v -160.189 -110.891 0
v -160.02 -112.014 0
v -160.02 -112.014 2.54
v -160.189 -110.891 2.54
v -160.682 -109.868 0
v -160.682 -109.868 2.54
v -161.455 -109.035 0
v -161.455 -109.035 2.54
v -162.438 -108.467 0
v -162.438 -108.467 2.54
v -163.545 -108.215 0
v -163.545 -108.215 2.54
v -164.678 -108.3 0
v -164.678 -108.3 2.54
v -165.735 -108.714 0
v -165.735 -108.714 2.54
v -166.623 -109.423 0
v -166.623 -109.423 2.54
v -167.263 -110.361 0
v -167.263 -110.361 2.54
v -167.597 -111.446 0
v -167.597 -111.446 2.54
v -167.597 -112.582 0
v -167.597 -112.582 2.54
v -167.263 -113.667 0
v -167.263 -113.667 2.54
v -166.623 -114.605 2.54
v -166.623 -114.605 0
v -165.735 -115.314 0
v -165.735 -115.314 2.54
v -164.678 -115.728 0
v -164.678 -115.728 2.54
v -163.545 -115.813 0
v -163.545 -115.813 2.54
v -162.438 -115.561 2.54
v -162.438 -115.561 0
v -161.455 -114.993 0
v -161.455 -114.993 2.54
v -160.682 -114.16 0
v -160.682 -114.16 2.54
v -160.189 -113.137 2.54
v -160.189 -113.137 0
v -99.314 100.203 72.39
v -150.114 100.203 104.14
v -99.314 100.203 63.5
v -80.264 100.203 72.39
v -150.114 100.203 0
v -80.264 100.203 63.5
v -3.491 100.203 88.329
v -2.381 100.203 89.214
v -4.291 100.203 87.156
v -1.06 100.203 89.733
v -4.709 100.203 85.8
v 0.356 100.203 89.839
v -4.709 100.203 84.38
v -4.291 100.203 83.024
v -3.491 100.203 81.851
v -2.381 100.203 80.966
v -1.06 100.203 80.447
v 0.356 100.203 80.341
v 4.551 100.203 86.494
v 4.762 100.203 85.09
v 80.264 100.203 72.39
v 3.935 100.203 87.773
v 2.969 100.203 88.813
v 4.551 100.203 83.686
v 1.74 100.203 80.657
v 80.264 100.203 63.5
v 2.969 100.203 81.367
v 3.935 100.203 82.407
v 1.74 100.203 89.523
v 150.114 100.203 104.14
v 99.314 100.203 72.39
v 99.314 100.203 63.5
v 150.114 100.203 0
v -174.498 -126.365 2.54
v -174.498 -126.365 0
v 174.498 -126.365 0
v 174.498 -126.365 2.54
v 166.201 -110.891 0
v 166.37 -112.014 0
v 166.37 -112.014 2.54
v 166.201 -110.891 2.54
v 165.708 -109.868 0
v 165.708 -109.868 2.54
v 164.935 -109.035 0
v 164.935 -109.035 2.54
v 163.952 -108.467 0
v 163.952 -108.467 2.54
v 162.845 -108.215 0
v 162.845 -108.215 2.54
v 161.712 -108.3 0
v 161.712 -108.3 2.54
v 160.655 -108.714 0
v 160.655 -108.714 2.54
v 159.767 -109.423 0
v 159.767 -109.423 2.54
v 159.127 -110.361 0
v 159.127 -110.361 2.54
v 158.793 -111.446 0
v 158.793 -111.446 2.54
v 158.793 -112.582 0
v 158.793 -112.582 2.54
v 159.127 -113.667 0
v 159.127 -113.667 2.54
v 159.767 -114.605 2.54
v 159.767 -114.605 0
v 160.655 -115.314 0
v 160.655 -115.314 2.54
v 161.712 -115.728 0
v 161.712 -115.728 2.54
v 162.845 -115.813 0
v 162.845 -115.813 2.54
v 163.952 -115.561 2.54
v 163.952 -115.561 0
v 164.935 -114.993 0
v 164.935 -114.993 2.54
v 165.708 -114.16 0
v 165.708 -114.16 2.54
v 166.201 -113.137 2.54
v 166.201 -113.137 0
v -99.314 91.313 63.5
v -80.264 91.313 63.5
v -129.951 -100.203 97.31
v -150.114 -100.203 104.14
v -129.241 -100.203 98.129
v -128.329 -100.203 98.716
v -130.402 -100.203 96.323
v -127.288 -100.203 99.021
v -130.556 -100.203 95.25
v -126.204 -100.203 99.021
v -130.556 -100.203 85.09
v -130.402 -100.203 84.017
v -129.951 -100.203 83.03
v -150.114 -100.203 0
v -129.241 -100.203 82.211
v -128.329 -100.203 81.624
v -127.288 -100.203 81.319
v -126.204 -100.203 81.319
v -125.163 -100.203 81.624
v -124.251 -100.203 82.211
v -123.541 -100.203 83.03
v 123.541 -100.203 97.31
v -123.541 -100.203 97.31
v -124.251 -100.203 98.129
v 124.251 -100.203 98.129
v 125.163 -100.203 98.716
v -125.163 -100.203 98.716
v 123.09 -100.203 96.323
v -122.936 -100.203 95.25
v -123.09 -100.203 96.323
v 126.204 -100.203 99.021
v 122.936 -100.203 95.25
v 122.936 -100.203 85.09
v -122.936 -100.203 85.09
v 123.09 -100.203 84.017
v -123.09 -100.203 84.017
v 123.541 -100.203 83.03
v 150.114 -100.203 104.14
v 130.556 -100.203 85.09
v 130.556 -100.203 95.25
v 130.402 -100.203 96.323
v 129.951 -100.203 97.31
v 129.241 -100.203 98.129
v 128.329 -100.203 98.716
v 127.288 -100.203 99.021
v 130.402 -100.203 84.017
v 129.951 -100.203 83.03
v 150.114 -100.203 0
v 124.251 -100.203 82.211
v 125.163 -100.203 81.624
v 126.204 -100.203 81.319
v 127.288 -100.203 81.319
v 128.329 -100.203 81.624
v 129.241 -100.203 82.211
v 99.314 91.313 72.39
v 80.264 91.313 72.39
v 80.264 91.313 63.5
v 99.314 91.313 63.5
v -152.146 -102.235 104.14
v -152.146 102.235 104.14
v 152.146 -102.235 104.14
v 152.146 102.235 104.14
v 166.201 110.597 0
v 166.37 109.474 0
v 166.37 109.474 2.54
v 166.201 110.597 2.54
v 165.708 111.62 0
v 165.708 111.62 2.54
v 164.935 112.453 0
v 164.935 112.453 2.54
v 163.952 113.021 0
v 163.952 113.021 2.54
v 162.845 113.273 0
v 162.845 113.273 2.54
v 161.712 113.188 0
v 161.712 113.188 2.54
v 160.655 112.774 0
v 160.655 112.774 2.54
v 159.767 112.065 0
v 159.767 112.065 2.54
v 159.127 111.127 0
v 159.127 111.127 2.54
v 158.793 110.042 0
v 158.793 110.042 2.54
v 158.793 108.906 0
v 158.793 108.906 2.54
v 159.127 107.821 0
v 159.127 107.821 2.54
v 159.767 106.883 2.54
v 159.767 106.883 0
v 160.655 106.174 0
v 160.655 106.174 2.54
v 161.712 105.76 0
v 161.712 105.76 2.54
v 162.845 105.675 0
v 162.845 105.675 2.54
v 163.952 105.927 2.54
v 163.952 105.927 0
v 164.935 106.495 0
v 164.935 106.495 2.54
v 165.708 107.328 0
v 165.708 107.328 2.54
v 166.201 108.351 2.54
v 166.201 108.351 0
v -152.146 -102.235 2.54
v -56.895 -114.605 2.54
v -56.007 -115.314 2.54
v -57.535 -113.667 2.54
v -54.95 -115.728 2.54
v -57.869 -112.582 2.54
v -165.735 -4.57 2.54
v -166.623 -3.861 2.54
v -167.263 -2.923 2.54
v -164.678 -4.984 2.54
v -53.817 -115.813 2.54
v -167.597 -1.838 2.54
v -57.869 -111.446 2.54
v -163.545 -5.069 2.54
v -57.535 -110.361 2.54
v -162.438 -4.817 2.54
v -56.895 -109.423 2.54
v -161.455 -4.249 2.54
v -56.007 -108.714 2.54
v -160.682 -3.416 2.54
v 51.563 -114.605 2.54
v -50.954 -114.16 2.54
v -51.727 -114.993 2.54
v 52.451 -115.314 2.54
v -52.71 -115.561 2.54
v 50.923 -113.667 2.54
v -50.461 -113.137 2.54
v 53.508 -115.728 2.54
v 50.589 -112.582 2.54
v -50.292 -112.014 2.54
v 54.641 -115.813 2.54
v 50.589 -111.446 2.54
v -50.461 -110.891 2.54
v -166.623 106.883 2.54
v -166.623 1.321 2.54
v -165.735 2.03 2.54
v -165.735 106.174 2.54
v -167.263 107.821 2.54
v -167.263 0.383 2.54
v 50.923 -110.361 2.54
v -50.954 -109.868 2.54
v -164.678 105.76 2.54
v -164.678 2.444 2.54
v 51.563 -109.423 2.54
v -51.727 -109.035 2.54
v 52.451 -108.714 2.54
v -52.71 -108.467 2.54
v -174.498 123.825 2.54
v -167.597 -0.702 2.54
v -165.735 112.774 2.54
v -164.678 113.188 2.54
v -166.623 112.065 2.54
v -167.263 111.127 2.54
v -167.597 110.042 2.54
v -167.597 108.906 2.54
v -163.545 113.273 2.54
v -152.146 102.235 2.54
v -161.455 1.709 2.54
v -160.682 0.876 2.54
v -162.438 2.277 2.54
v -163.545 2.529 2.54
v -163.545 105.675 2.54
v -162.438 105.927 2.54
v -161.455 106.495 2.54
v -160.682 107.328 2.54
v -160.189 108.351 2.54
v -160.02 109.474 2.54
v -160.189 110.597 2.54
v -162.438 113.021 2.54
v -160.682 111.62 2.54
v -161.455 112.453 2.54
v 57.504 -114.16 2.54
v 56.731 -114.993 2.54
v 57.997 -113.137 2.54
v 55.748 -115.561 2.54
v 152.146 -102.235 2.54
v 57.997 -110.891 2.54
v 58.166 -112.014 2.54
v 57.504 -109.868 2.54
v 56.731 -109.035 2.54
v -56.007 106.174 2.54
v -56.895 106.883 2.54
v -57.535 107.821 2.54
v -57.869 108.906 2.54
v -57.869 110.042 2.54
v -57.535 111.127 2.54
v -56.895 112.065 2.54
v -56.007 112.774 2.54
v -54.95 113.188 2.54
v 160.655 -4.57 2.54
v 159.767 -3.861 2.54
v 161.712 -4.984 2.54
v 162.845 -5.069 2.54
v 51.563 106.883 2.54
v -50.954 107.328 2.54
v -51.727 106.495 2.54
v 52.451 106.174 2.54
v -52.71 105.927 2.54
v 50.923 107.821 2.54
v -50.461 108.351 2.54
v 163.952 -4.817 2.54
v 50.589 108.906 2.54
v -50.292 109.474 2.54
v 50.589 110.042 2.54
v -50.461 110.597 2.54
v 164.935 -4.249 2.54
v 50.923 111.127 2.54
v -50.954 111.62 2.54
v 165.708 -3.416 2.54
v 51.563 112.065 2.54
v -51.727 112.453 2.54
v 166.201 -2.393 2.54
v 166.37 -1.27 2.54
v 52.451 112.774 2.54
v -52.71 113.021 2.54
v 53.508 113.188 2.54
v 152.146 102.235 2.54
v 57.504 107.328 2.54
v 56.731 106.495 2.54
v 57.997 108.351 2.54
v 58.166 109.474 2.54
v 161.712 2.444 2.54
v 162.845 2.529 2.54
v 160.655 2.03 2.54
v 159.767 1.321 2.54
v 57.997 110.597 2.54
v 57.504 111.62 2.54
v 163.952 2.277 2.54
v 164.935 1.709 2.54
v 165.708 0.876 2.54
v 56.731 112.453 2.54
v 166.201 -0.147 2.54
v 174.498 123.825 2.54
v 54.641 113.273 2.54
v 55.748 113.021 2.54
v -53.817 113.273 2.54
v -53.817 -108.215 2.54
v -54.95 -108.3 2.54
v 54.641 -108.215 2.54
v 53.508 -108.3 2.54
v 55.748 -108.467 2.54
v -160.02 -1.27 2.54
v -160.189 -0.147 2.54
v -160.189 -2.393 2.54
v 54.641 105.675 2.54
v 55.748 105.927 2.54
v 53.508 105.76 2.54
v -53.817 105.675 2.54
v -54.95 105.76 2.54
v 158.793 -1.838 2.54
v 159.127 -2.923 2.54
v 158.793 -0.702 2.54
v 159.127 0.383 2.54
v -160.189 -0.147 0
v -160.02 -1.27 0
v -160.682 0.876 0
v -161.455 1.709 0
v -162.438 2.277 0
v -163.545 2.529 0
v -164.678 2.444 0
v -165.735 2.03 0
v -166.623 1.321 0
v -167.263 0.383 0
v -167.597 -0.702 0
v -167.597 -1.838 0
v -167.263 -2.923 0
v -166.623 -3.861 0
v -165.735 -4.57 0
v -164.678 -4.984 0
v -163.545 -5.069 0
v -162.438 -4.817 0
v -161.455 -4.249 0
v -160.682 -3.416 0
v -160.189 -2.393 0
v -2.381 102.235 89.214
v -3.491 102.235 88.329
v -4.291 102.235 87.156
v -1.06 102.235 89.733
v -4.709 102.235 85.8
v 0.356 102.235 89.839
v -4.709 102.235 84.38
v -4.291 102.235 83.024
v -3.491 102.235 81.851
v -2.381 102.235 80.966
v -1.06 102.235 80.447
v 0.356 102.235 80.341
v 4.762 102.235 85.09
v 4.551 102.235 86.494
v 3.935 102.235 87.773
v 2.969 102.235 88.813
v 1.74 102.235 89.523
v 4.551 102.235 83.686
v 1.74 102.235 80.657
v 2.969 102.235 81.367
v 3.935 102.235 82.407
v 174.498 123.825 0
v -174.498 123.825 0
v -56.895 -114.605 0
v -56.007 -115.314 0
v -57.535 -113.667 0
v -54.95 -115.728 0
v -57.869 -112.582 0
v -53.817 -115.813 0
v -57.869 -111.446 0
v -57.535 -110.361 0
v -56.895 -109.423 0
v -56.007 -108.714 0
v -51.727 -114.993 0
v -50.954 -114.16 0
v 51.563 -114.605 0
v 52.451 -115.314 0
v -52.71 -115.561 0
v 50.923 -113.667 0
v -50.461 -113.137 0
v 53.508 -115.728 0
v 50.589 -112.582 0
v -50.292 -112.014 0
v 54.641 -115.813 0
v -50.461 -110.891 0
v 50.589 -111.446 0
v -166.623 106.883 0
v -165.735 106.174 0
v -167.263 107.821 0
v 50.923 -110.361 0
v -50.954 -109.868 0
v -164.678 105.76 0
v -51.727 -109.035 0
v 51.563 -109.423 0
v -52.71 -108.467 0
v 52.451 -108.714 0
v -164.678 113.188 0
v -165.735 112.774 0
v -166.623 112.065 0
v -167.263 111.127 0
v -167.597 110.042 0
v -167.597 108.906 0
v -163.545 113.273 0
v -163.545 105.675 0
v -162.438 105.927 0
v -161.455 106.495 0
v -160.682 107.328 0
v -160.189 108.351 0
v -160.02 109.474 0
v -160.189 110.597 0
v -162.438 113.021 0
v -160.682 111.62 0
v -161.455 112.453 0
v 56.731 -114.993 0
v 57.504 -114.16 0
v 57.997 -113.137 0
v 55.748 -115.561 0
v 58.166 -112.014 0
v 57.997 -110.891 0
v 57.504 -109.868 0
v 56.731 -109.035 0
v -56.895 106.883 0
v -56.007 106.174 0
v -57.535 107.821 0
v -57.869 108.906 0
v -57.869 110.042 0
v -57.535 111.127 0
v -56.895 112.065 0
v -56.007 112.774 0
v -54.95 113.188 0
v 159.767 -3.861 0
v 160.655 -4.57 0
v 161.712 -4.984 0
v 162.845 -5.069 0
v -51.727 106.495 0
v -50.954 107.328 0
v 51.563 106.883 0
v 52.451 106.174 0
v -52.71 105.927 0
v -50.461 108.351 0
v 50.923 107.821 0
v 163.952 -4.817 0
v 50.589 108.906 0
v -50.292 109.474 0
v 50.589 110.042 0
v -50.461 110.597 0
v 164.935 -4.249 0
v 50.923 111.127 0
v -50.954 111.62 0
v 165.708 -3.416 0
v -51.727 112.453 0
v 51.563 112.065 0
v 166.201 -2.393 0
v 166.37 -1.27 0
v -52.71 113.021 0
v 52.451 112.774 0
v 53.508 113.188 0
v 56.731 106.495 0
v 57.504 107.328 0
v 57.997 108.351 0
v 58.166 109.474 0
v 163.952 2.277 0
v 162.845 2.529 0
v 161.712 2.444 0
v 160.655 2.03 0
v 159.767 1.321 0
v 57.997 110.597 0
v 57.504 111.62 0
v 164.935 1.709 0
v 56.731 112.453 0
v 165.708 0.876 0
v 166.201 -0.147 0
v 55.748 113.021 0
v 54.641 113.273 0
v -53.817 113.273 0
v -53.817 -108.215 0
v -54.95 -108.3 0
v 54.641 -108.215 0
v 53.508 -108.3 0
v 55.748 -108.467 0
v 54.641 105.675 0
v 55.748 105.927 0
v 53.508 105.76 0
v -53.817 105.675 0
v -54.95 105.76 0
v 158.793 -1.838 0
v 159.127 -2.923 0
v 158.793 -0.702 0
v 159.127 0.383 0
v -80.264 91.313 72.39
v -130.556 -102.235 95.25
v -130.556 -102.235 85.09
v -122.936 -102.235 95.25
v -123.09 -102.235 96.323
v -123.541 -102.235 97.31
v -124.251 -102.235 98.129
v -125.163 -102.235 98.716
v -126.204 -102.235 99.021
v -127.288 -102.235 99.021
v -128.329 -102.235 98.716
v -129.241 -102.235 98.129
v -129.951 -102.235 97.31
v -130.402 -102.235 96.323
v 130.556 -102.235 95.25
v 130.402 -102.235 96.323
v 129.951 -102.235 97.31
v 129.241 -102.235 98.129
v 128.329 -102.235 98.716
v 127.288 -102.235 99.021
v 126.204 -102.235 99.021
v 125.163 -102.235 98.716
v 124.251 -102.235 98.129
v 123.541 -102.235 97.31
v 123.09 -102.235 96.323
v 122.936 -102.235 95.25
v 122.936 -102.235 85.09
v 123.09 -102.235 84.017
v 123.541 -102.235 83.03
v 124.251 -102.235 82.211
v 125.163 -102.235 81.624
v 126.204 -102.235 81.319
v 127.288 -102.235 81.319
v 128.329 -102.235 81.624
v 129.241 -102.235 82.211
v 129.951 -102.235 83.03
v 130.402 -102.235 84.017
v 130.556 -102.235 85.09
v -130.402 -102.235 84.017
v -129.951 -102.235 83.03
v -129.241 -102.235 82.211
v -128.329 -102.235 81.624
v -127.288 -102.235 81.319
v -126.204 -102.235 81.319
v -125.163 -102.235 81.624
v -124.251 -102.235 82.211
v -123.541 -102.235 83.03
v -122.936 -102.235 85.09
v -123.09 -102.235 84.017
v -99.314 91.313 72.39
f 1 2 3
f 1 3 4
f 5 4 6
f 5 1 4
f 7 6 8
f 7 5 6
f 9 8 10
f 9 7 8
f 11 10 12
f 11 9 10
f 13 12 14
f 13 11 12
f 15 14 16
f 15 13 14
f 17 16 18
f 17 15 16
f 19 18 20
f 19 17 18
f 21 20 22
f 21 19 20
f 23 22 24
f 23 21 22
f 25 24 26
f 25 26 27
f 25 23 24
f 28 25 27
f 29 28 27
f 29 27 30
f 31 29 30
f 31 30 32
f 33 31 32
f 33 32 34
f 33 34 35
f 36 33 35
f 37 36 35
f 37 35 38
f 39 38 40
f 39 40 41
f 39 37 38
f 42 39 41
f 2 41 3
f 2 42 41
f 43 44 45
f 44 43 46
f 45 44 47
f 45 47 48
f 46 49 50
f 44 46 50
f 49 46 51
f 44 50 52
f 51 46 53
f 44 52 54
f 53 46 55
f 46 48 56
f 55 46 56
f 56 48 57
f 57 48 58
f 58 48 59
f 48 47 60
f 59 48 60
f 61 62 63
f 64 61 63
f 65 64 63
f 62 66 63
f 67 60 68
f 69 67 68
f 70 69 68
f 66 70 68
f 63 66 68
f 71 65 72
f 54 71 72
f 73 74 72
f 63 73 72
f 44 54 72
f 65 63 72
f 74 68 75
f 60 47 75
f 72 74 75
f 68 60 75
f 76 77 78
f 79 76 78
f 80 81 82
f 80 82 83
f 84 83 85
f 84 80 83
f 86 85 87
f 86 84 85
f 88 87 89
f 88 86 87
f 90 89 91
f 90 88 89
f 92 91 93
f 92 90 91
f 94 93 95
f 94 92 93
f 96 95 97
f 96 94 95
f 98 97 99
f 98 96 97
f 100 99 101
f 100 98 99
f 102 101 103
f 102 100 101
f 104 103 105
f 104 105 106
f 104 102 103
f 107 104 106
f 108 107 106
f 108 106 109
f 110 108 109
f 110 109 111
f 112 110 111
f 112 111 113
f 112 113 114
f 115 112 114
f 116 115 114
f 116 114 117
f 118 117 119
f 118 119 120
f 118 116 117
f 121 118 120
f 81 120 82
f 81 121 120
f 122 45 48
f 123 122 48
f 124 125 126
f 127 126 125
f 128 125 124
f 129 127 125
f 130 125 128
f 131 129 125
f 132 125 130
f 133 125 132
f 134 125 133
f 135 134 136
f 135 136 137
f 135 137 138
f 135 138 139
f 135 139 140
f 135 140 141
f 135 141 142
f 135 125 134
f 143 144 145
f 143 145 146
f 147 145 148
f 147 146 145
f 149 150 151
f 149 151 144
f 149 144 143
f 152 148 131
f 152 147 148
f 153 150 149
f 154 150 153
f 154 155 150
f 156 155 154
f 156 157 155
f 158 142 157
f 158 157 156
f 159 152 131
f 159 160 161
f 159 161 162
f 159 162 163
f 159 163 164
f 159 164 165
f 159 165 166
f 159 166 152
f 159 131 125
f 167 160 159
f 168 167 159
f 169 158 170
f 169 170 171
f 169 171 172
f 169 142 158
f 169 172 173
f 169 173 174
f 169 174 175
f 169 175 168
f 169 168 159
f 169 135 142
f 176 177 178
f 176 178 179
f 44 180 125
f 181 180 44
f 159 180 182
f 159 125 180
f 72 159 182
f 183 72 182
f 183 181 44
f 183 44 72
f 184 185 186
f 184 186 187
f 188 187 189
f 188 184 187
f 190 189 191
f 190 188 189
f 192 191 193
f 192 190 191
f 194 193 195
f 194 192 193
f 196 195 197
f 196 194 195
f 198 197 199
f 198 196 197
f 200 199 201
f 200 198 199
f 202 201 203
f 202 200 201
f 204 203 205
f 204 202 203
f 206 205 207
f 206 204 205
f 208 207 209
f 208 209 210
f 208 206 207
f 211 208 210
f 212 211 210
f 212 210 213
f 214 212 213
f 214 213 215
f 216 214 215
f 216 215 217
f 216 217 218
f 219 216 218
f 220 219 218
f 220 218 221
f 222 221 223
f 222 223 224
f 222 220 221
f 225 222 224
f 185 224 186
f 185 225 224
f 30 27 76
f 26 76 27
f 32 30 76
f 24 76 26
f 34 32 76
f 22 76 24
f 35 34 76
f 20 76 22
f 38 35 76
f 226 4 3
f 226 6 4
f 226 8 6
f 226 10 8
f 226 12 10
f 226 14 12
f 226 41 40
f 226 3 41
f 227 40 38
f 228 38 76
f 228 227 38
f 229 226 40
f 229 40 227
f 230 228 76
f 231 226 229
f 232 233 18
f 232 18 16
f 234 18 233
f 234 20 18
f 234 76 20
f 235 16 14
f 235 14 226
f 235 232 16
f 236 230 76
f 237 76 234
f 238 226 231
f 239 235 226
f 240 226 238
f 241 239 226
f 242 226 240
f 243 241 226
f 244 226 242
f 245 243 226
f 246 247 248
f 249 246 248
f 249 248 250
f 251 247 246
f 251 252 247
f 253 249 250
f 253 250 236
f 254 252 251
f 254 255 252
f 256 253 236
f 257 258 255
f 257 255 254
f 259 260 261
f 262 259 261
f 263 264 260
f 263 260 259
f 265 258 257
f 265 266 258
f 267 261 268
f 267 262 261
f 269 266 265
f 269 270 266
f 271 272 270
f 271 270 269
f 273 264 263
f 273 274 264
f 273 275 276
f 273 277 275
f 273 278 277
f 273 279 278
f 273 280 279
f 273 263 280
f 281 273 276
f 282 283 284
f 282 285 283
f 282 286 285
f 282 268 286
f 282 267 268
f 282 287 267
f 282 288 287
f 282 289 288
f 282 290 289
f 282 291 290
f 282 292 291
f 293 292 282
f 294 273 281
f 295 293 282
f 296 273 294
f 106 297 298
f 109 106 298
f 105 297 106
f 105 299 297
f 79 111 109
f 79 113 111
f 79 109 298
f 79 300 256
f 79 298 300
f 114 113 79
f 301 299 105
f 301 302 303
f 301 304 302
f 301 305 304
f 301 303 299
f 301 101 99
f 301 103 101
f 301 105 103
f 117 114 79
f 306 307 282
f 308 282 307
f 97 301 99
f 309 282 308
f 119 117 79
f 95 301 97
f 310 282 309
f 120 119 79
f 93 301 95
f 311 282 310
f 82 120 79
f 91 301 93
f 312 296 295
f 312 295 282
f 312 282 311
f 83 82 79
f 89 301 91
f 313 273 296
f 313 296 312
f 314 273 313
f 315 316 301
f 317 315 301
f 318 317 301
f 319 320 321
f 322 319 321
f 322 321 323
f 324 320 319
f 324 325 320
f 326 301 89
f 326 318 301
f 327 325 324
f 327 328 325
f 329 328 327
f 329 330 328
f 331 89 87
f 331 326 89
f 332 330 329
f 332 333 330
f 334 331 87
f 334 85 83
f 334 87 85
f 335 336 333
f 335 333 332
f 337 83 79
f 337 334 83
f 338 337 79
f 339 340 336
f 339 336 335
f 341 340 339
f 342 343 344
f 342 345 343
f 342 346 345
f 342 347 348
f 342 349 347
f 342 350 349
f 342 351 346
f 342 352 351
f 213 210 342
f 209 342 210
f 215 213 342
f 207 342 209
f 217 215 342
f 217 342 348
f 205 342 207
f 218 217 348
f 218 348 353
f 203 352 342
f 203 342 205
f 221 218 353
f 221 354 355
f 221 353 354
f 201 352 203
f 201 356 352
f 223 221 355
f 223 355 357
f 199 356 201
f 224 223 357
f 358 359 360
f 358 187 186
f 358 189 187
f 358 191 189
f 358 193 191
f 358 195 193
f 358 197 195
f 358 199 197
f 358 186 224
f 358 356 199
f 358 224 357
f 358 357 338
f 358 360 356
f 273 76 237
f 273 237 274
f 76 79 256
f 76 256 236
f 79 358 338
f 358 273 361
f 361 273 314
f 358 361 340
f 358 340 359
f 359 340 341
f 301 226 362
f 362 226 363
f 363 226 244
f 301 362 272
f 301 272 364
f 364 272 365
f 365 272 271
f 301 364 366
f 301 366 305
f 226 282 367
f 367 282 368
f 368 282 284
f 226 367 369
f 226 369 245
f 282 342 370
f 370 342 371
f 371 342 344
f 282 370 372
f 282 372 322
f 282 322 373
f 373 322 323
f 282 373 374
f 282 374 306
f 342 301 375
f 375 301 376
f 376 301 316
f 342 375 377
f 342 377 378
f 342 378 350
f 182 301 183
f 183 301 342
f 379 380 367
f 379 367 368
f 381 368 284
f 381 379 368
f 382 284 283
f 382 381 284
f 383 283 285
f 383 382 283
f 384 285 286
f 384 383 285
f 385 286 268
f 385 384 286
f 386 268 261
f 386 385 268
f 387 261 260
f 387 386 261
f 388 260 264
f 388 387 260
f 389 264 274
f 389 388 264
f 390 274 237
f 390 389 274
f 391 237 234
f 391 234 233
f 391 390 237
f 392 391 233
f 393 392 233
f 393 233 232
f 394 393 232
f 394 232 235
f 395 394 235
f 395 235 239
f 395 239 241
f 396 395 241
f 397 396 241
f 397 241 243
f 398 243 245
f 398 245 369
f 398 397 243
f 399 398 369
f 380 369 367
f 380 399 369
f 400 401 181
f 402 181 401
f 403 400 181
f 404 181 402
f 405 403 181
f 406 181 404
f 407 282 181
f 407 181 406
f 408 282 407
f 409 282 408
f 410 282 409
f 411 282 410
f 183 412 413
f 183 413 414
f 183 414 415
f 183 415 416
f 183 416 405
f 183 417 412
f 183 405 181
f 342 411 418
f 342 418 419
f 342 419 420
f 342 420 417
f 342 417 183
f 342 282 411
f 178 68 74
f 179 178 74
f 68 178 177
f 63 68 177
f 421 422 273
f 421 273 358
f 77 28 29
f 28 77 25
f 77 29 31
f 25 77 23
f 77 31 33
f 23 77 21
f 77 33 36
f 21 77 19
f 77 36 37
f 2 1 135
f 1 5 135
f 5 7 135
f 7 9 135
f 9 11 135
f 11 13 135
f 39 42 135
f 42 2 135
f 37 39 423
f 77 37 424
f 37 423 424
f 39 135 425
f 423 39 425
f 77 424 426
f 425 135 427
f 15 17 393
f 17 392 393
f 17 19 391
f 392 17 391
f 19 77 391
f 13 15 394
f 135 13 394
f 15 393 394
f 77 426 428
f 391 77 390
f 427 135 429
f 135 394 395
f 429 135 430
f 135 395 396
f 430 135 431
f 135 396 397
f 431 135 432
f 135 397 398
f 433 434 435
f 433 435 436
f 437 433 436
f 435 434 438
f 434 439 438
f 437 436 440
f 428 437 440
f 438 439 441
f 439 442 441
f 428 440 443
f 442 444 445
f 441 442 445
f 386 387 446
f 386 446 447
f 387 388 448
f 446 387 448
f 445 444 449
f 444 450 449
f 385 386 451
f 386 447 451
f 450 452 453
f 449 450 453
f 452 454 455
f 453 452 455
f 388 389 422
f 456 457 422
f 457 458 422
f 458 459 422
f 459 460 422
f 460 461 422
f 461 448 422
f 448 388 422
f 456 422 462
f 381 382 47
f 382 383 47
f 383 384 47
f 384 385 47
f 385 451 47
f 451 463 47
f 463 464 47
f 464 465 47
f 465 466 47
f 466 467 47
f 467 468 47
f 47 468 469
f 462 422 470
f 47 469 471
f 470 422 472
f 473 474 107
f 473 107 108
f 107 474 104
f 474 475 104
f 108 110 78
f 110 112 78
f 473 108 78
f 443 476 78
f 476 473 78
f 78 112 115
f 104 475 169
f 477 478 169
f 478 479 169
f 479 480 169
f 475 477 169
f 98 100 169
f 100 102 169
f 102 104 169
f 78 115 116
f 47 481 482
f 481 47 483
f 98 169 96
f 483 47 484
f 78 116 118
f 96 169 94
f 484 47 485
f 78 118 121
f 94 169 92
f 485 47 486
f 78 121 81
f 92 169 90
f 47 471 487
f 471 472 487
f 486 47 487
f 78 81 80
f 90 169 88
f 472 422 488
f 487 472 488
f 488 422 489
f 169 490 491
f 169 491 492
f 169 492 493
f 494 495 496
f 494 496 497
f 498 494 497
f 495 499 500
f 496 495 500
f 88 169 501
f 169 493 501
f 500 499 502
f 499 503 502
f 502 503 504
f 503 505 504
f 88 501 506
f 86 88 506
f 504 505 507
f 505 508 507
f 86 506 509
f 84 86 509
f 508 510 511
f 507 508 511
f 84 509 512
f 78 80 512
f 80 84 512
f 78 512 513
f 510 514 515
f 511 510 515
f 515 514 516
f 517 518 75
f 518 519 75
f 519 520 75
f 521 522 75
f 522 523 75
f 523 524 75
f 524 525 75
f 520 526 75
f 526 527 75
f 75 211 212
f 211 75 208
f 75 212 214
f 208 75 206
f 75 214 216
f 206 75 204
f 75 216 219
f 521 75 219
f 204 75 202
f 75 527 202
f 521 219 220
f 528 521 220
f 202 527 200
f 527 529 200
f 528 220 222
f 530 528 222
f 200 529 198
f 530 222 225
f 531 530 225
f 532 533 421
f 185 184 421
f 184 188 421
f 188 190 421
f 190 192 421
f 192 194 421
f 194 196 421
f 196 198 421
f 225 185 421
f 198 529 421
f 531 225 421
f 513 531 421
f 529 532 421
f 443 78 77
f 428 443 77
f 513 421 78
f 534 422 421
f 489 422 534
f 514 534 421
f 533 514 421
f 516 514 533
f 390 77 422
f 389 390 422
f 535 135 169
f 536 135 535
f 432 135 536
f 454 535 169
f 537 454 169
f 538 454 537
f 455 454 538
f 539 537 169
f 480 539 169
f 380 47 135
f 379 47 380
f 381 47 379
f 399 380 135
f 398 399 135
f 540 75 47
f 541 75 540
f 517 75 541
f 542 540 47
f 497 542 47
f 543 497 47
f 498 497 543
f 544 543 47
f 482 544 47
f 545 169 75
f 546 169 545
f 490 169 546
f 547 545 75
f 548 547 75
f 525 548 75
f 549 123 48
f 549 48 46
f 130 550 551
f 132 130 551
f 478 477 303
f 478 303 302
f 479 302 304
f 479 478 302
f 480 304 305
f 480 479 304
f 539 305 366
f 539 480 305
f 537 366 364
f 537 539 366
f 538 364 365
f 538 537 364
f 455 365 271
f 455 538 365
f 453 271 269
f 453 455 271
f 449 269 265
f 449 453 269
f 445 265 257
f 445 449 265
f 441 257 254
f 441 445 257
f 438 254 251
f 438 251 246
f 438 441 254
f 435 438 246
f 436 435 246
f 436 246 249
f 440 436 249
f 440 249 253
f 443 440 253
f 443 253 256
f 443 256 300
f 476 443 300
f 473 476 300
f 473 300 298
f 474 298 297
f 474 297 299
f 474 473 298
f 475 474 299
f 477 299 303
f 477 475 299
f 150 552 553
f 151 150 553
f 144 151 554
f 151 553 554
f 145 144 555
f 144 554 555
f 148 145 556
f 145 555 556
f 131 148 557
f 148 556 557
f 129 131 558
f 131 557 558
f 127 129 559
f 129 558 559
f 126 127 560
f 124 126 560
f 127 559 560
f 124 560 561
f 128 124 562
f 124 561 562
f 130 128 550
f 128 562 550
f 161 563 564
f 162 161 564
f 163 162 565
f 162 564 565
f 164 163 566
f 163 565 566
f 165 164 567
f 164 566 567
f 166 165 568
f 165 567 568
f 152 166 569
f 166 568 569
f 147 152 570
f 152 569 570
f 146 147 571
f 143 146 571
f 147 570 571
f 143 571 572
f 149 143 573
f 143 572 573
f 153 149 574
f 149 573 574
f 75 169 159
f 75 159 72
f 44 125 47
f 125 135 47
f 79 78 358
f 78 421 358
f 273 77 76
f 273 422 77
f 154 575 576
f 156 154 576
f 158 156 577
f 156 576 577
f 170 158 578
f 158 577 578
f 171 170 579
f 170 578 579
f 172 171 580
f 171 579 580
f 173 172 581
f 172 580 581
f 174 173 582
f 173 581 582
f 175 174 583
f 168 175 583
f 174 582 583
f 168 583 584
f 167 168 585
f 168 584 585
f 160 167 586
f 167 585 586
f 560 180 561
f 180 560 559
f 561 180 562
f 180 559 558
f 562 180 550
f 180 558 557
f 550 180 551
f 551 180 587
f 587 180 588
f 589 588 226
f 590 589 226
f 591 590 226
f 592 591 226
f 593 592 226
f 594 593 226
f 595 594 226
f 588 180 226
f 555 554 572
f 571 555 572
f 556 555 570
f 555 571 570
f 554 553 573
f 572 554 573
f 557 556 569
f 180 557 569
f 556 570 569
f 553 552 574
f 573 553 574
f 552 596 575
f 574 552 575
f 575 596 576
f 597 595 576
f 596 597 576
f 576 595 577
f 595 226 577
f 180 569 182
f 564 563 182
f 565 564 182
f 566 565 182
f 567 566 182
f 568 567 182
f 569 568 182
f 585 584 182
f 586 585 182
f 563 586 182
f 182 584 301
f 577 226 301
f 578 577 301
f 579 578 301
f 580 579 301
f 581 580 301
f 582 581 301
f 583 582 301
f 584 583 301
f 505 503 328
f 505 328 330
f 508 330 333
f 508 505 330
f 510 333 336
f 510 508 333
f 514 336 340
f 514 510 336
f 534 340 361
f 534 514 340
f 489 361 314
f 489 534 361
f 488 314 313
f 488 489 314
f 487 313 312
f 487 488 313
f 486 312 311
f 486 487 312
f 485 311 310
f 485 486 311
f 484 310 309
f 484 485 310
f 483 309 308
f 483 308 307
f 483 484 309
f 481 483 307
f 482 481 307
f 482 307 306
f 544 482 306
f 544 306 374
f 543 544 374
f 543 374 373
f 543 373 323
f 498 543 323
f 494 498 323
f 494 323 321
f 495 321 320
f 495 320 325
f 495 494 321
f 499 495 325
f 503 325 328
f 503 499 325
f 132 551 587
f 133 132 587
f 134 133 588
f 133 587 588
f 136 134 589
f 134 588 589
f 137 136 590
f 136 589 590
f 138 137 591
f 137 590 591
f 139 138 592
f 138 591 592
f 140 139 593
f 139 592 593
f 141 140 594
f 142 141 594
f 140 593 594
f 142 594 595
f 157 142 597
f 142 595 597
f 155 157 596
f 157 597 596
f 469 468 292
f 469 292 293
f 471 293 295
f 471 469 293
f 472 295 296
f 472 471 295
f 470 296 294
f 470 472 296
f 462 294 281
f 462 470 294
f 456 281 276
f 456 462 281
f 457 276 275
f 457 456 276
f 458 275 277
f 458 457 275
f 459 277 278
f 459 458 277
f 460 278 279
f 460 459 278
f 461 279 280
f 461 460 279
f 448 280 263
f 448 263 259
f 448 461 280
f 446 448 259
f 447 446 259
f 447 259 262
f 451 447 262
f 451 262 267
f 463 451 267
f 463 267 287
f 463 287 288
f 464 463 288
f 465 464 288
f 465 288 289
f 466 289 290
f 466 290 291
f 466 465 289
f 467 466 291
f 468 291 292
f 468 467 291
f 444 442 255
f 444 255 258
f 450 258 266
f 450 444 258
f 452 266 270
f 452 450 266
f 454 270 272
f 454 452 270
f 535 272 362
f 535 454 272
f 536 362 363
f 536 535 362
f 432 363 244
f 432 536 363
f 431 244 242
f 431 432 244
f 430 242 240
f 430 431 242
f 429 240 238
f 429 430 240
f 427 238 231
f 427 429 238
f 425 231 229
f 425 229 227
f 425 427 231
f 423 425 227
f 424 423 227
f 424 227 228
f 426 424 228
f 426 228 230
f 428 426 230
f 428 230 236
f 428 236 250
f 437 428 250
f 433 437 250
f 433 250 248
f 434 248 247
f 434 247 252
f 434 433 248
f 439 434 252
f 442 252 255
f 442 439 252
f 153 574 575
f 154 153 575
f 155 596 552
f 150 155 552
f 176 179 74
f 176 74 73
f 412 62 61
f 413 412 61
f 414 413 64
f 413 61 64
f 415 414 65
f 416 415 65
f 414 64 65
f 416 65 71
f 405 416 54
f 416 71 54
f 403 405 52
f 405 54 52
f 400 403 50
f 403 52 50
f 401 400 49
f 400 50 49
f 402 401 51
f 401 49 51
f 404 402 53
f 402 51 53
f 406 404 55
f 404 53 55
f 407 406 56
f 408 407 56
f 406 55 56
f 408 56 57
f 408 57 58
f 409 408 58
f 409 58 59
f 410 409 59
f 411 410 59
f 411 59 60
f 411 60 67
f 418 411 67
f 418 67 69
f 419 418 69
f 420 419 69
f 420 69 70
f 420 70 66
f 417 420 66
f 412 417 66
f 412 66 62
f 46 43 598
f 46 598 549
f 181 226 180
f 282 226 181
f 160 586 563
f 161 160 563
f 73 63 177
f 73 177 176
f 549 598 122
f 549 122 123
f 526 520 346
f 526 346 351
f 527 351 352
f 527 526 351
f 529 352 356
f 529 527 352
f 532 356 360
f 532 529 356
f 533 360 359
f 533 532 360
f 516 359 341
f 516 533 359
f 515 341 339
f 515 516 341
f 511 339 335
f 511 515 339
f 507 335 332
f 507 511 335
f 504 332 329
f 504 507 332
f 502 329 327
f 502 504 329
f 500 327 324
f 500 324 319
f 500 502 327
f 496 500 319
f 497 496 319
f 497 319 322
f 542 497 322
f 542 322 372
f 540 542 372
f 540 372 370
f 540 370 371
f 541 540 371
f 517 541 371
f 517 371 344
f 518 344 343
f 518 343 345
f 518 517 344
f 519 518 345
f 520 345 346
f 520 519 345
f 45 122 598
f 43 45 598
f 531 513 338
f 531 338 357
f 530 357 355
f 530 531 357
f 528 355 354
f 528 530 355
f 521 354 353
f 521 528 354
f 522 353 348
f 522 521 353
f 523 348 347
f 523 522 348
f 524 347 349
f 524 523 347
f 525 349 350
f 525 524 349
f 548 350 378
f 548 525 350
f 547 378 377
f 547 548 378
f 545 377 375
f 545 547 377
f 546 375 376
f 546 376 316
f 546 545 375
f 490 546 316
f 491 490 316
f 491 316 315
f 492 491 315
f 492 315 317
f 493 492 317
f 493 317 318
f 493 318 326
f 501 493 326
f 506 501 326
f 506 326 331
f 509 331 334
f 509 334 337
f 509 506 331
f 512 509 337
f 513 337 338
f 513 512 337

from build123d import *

# Parameters (mm, degrees)
F0_W      = 348.996
F0_H      = 247.65
F0_R      = 3.81
F0_W_2    = 300.228
F0_H_2    = 200.406
F1_DEPTH  = 2.54
F2_W      = 304.292
F2_H      = 204.47
F2_W_2    = 300.228
F2_H_2    = 200.406
F3_DEPTH  = 101.6
F5_DEPTH  = 25.4
F6_W      = 19.05
F6_H      = 8.89
F7_DEPTH  = 8.89
F8_DEPTH  = 2.54
F10_D     = 9.525
F10_DEPTH = 12.7
F10_TIP   = 2.8615986981


with BuildPart() as f1:
    # F0 (on Top) → F1 (new body)
    with BuildSketch(Plane.XY):
        Rectangle(F0_W, F0_H)
        with Locations((-163.83, -112.014)):
            Circle(F0_R, mode=Mode.SUBTRACT)
        with Locations((-54.102, -112.014)):
            Circle(F0_R, mode=Mode.SUBTRACT)
        with Locations((-163.83, -1.27)):
            Circle(F0_R, mode=Mode.SUBTRACT)
        with Locations((54.356, -112.014)):
            Circle(F0_R, mode=Mode.SUBTRACT)
        with Locations((162.56, -112.014)):
            Circle(F0_R, mode=Mode.SUBTRACT)
        with Locations((162.56, -1.27)):
            Circle(F0_R, mode=Mode.SUBTRACT)
        with Locations((-163.83, 109.474)):
            Circle(F0_R, mode=Mode.SUBTRACT)
        with Locations((-54.102, 109.474)):
            Circle(F0_R, mode=Mode.SUBTRACT)
        Rectangle(F0_W_2, F0_H_2, mode=Mode.SUBTRACT)
        with Locations((54.356, 109.474)):
            Circle(F0_R, mode=Mode.SUBTRACT)
        with Locations((162.56, 109.474)):
            Circle(F0_R, mode=Mode.SUBTRACT)
    extrude(amount=F1_DEPTH)

    # F2 (on face) → F3 (join)
    with BuildSketch(Plane.XY.offset(2.54)):
        Rectangle(F2_W, F2_H)
        Rectangle(F2_W_2, F2_H_2, mode=Mode.SUBTRACT)
    extrude(amount=F3_DEPTH)

    # F4 (on face) → F5 (cut)
    with BuildSketch(Plane.XZ.offset(102.235)):
        with BuildLine():
            Line((122.936, 95.25), (122.936, 85.09))
            ThreePointArc((122.936, 85.09), (126.746, 81.28), (130.556, 85.09))
            Line((130.556, 85.09), (130.556, 95.25))
            ThreePointArc((130.556, 95.25), (126.746, 99.06), (122.936, 95.25))
        make_face()
        with BuildLine():
            Line((-130.556, 95.25), (-130.556, 85.09))
            ThreePointArc((-130.556, 85.09), (-126.746, 81.28), (-122.936, 85.09))
            Line((-122.936, 85.09), (-122.936, 95.25))
            ThreePointArc((-122.936, 95.25), (-126.746, 99.06), (-130.556, 95.25))
        make_face()
    extrude(amount=-F5_DEPTH, mode=Mode.SUBTRACT)

    # F6 (on face) → F7 (join)
    with BuildSketch(Plane.XZ.offset(-100.203)):
        with Locations((-89.789, 67.945)):
            Rectangle(F6_W, F6_H)
        with Locations((89.789, 67.945)):
            Rectangle(F6_W, F6_H)
    extrude(amount=F7_DEPTH)

    # F8 (add): a face of the model
    f8_faces = [f1.faces().sort_by_distance(p)[0] for p in [
        (0, -123.825, 1.27),
    ]]
    extrude(f8_faces, amount=F8_DEPTH)

    # F10
    with Locations(Plane(origin=(0, 102.235, 0), x_dir=(-1, 0, 0), z_dir=(0, 1, 0))):
        with Locations((0, 85.09)):
            Hole(F10_D / 2, depth=F10_DEPTH)
            with Locations((0, 0, -(F10_DEPTH + F10_TIP / 2))):  # 118° drill point
                Cone(0, F10_D / 2, F10_TIP, mode=Mode.SUBTRACT)


solid = f1.part
